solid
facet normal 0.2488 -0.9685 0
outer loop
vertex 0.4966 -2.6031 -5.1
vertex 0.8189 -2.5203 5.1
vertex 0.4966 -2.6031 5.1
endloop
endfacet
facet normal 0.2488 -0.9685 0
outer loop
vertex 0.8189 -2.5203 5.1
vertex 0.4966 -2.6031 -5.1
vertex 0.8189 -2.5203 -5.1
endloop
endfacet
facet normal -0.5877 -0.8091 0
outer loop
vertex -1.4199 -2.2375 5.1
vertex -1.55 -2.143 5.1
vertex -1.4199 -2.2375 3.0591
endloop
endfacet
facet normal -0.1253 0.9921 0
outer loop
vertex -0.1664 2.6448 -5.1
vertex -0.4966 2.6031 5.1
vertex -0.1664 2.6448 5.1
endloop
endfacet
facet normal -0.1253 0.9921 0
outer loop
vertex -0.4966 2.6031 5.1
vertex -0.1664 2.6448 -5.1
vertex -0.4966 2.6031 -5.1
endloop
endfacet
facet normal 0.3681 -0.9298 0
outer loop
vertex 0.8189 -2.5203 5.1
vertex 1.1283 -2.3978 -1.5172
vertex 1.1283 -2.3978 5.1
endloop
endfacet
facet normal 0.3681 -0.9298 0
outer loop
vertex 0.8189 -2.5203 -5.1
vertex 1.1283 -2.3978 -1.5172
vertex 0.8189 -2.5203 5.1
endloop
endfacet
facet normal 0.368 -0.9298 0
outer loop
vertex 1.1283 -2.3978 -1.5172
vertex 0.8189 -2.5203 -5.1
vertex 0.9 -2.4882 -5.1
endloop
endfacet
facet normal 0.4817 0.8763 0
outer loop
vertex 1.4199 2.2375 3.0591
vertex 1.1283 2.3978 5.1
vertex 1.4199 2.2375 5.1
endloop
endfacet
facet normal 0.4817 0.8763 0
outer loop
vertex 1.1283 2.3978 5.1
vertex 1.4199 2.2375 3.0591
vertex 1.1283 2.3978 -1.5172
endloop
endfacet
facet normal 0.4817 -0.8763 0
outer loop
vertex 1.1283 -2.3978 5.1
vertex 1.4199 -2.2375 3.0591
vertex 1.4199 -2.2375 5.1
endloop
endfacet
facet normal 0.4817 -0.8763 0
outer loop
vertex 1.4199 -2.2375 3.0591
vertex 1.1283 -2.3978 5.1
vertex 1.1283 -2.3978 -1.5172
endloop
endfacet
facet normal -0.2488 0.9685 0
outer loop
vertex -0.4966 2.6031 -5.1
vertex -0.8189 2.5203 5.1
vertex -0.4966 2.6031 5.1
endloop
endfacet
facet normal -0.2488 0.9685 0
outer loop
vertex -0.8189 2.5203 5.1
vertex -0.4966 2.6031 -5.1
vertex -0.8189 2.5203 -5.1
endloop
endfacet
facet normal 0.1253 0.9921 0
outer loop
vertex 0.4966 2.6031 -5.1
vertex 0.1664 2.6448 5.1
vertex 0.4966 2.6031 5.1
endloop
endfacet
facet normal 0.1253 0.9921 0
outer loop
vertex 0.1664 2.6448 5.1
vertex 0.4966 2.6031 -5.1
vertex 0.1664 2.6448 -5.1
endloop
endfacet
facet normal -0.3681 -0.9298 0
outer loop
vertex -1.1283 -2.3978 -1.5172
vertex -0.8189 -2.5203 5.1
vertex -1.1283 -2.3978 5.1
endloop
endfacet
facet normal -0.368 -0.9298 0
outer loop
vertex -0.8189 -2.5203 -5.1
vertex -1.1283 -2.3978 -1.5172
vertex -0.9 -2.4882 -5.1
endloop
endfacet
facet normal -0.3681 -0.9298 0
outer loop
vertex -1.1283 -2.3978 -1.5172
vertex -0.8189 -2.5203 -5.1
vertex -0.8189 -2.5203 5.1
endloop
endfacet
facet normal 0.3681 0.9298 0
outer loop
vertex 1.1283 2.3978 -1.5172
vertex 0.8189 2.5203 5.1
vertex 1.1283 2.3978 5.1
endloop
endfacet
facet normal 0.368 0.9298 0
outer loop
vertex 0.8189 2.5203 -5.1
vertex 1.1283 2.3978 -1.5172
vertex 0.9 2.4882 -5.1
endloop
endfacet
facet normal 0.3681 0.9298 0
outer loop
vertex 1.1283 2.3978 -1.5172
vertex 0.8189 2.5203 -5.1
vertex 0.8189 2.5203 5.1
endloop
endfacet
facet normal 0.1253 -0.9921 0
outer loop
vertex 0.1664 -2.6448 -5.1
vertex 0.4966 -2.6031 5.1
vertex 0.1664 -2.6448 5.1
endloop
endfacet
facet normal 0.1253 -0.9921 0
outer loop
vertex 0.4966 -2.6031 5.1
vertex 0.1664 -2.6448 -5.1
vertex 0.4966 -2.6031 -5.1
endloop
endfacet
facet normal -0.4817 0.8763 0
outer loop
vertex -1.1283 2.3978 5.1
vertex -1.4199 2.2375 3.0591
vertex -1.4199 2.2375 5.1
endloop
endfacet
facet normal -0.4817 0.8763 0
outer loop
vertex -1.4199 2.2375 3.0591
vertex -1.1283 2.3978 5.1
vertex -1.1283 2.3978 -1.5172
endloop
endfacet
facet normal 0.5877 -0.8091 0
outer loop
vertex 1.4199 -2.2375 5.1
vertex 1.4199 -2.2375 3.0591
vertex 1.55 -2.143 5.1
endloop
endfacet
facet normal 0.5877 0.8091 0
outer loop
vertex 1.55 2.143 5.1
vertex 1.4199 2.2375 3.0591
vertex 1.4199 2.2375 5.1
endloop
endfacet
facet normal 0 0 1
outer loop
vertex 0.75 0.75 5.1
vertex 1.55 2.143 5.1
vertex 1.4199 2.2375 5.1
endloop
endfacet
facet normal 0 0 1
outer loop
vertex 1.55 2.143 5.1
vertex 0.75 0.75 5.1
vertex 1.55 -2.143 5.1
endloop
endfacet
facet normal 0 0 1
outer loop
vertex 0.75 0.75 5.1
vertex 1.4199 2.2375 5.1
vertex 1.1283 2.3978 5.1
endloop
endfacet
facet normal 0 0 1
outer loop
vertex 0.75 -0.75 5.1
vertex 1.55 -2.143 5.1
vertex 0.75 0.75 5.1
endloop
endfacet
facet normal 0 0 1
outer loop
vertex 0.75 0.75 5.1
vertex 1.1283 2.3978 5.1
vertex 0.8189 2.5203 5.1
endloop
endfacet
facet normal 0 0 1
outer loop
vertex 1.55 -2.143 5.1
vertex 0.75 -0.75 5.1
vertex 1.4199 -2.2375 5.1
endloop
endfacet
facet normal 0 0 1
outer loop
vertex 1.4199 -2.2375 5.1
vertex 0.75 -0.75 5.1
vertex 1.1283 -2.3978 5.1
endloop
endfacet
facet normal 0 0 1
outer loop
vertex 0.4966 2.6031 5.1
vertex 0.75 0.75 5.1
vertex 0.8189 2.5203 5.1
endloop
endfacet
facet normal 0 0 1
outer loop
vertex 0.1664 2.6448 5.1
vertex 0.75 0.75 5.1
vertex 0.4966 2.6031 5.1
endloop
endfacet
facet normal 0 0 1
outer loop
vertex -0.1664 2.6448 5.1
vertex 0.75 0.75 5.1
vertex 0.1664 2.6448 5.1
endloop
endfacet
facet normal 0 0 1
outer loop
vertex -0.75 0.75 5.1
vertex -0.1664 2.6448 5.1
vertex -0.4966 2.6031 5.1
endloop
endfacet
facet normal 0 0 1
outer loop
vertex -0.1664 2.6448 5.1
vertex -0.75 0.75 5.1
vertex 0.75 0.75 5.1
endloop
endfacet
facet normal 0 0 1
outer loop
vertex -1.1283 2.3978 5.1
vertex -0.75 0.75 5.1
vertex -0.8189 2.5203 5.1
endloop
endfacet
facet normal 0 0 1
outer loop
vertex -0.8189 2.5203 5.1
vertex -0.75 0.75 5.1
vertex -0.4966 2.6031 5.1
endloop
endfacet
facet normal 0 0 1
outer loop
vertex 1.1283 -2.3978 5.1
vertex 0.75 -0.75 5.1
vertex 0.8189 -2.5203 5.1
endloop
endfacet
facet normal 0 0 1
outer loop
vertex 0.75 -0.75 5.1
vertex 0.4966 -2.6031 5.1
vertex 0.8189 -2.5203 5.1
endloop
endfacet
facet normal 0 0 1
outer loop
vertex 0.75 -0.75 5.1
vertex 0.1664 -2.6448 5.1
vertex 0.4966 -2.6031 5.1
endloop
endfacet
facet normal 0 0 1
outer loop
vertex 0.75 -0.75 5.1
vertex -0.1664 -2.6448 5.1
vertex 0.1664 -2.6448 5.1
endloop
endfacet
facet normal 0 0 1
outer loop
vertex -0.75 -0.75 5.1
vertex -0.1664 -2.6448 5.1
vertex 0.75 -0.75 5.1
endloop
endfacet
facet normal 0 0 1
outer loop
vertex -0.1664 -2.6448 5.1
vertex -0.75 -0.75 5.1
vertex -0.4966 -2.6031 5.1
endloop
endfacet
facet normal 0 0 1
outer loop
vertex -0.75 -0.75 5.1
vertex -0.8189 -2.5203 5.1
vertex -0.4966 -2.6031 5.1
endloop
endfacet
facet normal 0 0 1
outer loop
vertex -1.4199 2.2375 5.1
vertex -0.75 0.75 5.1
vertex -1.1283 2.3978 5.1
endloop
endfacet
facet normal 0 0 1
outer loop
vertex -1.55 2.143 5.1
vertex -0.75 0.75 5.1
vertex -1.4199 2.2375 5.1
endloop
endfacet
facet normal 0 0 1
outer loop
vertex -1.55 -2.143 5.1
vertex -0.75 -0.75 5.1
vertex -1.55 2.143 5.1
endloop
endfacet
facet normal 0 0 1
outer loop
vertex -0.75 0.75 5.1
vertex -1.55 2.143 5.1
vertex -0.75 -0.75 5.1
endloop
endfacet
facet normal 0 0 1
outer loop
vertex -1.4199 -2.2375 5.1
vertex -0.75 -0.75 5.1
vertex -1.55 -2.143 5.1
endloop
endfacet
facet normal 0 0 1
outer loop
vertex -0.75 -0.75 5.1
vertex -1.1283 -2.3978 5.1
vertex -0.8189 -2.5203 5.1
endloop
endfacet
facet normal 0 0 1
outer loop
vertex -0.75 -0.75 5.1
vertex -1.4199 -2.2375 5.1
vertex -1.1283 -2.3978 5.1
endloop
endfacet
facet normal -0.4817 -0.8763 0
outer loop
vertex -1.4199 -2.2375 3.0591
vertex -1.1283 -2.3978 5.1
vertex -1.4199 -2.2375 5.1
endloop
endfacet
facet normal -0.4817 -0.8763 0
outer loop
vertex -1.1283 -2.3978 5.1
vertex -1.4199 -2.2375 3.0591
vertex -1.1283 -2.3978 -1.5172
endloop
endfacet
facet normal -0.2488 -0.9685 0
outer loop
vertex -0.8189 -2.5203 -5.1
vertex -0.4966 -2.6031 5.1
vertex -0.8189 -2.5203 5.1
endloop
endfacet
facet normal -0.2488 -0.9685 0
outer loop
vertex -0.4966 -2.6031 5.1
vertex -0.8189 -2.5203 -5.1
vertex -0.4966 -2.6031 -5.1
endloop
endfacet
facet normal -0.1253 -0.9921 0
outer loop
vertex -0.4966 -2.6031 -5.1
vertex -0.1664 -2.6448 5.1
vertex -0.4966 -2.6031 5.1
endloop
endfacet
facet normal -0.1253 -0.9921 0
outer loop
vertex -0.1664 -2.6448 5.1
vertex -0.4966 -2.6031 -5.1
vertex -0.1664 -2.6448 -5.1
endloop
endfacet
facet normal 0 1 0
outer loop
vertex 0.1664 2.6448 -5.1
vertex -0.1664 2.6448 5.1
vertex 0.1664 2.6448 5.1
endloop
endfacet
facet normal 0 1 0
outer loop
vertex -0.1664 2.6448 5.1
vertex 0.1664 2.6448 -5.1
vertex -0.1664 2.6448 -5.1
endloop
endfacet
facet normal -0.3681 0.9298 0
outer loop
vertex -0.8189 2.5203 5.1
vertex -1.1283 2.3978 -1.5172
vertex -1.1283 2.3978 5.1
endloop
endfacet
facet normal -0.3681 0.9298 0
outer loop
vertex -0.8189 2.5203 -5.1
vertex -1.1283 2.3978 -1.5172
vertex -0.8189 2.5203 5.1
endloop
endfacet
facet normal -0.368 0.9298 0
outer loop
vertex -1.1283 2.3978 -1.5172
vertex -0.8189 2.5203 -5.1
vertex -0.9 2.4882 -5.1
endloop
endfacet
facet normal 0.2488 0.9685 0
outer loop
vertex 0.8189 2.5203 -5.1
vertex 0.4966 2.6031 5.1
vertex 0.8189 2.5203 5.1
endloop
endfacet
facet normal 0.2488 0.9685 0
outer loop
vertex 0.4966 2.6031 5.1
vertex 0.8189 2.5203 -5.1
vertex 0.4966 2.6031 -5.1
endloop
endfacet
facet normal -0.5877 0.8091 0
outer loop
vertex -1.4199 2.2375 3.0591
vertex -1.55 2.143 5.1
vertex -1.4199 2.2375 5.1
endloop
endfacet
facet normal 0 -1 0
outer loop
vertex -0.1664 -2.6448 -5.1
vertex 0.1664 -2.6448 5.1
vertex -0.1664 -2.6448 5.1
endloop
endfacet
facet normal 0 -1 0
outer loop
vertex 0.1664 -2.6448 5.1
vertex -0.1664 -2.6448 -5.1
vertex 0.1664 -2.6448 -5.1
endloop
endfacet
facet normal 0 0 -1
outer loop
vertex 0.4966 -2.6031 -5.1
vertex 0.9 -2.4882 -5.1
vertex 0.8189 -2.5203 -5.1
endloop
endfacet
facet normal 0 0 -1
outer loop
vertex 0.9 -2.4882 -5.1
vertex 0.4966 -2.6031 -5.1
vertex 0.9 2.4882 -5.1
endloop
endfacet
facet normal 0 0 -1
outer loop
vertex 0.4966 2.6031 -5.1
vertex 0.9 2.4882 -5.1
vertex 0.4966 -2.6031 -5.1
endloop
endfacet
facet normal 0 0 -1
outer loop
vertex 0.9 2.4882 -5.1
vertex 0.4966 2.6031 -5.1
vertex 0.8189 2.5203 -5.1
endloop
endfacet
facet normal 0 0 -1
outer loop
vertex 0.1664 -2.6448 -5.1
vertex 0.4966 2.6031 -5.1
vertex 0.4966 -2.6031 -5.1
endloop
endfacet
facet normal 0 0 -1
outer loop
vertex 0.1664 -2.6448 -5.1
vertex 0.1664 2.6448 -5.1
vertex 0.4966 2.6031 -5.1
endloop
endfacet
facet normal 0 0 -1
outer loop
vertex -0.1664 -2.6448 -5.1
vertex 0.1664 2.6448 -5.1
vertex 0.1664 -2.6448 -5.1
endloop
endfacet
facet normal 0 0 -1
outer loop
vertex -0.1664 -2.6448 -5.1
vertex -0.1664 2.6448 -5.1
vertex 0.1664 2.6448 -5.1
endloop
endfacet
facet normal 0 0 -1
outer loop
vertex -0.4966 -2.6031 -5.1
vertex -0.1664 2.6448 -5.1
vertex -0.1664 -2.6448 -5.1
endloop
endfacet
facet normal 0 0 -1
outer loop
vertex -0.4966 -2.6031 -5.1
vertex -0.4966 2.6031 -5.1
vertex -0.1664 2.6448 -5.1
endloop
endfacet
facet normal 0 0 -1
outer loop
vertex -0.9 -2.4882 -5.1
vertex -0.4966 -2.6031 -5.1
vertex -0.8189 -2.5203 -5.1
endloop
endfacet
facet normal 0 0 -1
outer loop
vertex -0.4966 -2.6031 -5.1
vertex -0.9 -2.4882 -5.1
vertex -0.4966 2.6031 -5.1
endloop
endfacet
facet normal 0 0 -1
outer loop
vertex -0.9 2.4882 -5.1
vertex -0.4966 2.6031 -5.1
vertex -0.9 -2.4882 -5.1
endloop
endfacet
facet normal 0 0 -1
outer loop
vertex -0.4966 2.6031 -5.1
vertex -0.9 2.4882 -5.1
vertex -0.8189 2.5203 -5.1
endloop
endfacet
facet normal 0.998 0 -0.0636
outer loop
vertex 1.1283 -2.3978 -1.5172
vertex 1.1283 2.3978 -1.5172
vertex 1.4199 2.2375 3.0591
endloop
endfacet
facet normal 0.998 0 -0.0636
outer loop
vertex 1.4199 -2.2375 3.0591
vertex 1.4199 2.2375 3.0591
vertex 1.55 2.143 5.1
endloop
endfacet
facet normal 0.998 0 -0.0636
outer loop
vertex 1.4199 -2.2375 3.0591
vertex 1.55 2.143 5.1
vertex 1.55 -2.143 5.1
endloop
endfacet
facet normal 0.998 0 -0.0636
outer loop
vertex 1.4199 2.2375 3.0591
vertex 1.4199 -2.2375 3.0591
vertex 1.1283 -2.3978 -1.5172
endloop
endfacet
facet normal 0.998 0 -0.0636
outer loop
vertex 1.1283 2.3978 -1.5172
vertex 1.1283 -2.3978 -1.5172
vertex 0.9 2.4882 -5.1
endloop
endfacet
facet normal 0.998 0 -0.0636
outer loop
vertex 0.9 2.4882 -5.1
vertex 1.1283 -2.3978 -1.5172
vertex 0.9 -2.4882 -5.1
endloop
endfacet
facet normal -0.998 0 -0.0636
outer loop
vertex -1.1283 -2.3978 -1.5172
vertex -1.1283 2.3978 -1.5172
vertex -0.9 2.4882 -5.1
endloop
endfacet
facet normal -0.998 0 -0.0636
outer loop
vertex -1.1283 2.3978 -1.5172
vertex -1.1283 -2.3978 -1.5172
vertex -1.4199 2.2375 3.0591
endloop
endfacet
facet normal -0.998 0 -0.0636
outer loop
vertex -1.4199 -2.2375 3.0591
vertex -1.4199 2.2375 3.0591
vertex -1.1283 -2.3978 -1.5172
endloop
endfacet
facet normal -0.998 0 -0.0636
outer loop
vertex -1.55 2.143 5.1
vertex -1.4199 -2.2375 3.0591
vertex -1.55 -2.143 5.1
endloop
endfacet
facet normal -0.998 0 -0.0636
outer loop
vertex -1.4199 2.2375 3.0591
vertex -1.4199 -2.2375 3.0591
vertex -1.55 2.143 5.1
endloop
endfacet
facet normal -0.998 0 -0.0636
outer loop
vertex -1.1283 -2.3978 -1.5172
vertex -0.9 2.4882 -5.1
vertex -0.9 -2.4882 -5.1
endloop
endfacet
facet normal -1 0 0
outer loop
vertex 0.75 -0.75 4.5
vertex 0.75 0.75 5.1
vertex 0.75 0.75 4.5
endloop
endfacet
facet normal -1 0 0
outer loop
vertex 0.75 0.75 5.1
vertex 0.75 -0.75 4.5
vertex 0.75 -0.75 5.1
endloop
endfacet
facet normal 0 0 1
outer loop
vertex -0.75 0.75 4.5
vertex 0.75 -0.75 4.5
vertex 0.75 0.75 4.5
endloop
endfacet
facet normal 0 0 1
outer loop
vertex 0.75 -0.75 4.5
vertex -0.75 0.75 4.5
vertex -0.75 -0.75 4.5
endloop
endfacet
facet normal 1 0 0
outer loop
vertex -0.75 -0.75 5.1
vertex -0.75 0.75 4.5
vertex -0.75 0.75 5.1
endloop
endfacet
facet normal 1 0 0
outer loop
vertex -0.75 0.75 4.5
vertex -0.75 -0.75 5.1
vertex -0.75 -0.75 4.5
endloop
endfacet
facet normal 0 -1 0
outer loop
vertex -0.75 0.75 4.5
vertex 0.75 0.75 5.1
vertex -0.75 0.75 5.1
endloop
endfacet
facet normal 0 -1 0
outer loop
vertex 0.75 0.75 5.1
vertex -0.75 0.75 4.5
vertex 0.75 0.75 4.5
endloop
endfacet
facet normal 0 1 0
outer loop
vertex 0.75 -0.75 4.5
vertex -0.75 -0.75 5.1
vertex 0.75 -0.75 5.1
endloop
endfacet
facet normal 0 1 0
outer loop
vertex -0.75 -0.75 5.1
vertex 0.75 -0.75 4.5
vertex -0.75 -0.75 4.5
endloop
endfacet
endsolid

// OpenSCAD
length = 3;
strong=true;

module locker(  h_total=10.2, 
                d_centre_haut=5.3, 
                largeur_bas=1.8, 
                largeur_haut=2.9, 
                strong=false
) {
    hauteur_trapeze = h_total;
    resolution = 50;

    difference() {
        intersection() {
            cylinder(h = h_total, d = d_centre_haut, center = true, $fn=resolution);

            // Découpe trapézoïdale intégrée
            hull() {
                translate([-largeur_bas/2, -5, -hauteur_trapeze/2])
                    cube([largeur_bas, 10, 0.1]);
                translate([-largeur_haut/2, -5, hauteur_trapeze/2])
                    cube([largeur_haut, 10, 0.1]);
            }
        }

        if (strong) {
            // Petit carré creusé sur le dessus
            profondeur = 0.6;
            translate([-1.5/2, -1.5/2, hauteur_trapeze/2 - profondeur])
                cube([1.5, 1.5, profondeur]);
        }
    }
}
// Exemple d'utilisation
//locker(h_total=16 -1.8, d_centre_haut=5.3, largeur_bas=1.8, largeur_haut=2.9); // Locker 4
//locker(h_total=12 -1.8, d_centre_haut=5.3, largeur_bas=1.8, largeur_haut=3.0); // Locker 3
//locker(h_total=8 -1.8, d_centre_haut=5.2, largeur_bas=1.8, largeur_haut=3.1); // locker-2
//locker(h_total=8 -1.8, d_centre_haut=5.3, largeur_bas=1.8, largeur_haut=3.1, strong=true); // locker-2-strong
locker(h_total=length * 4 - 1.8, d_centre_haut=5.3, largeur_bas=1.8, largeur_haut=3.1, strong=strong); // locker-2-strong
